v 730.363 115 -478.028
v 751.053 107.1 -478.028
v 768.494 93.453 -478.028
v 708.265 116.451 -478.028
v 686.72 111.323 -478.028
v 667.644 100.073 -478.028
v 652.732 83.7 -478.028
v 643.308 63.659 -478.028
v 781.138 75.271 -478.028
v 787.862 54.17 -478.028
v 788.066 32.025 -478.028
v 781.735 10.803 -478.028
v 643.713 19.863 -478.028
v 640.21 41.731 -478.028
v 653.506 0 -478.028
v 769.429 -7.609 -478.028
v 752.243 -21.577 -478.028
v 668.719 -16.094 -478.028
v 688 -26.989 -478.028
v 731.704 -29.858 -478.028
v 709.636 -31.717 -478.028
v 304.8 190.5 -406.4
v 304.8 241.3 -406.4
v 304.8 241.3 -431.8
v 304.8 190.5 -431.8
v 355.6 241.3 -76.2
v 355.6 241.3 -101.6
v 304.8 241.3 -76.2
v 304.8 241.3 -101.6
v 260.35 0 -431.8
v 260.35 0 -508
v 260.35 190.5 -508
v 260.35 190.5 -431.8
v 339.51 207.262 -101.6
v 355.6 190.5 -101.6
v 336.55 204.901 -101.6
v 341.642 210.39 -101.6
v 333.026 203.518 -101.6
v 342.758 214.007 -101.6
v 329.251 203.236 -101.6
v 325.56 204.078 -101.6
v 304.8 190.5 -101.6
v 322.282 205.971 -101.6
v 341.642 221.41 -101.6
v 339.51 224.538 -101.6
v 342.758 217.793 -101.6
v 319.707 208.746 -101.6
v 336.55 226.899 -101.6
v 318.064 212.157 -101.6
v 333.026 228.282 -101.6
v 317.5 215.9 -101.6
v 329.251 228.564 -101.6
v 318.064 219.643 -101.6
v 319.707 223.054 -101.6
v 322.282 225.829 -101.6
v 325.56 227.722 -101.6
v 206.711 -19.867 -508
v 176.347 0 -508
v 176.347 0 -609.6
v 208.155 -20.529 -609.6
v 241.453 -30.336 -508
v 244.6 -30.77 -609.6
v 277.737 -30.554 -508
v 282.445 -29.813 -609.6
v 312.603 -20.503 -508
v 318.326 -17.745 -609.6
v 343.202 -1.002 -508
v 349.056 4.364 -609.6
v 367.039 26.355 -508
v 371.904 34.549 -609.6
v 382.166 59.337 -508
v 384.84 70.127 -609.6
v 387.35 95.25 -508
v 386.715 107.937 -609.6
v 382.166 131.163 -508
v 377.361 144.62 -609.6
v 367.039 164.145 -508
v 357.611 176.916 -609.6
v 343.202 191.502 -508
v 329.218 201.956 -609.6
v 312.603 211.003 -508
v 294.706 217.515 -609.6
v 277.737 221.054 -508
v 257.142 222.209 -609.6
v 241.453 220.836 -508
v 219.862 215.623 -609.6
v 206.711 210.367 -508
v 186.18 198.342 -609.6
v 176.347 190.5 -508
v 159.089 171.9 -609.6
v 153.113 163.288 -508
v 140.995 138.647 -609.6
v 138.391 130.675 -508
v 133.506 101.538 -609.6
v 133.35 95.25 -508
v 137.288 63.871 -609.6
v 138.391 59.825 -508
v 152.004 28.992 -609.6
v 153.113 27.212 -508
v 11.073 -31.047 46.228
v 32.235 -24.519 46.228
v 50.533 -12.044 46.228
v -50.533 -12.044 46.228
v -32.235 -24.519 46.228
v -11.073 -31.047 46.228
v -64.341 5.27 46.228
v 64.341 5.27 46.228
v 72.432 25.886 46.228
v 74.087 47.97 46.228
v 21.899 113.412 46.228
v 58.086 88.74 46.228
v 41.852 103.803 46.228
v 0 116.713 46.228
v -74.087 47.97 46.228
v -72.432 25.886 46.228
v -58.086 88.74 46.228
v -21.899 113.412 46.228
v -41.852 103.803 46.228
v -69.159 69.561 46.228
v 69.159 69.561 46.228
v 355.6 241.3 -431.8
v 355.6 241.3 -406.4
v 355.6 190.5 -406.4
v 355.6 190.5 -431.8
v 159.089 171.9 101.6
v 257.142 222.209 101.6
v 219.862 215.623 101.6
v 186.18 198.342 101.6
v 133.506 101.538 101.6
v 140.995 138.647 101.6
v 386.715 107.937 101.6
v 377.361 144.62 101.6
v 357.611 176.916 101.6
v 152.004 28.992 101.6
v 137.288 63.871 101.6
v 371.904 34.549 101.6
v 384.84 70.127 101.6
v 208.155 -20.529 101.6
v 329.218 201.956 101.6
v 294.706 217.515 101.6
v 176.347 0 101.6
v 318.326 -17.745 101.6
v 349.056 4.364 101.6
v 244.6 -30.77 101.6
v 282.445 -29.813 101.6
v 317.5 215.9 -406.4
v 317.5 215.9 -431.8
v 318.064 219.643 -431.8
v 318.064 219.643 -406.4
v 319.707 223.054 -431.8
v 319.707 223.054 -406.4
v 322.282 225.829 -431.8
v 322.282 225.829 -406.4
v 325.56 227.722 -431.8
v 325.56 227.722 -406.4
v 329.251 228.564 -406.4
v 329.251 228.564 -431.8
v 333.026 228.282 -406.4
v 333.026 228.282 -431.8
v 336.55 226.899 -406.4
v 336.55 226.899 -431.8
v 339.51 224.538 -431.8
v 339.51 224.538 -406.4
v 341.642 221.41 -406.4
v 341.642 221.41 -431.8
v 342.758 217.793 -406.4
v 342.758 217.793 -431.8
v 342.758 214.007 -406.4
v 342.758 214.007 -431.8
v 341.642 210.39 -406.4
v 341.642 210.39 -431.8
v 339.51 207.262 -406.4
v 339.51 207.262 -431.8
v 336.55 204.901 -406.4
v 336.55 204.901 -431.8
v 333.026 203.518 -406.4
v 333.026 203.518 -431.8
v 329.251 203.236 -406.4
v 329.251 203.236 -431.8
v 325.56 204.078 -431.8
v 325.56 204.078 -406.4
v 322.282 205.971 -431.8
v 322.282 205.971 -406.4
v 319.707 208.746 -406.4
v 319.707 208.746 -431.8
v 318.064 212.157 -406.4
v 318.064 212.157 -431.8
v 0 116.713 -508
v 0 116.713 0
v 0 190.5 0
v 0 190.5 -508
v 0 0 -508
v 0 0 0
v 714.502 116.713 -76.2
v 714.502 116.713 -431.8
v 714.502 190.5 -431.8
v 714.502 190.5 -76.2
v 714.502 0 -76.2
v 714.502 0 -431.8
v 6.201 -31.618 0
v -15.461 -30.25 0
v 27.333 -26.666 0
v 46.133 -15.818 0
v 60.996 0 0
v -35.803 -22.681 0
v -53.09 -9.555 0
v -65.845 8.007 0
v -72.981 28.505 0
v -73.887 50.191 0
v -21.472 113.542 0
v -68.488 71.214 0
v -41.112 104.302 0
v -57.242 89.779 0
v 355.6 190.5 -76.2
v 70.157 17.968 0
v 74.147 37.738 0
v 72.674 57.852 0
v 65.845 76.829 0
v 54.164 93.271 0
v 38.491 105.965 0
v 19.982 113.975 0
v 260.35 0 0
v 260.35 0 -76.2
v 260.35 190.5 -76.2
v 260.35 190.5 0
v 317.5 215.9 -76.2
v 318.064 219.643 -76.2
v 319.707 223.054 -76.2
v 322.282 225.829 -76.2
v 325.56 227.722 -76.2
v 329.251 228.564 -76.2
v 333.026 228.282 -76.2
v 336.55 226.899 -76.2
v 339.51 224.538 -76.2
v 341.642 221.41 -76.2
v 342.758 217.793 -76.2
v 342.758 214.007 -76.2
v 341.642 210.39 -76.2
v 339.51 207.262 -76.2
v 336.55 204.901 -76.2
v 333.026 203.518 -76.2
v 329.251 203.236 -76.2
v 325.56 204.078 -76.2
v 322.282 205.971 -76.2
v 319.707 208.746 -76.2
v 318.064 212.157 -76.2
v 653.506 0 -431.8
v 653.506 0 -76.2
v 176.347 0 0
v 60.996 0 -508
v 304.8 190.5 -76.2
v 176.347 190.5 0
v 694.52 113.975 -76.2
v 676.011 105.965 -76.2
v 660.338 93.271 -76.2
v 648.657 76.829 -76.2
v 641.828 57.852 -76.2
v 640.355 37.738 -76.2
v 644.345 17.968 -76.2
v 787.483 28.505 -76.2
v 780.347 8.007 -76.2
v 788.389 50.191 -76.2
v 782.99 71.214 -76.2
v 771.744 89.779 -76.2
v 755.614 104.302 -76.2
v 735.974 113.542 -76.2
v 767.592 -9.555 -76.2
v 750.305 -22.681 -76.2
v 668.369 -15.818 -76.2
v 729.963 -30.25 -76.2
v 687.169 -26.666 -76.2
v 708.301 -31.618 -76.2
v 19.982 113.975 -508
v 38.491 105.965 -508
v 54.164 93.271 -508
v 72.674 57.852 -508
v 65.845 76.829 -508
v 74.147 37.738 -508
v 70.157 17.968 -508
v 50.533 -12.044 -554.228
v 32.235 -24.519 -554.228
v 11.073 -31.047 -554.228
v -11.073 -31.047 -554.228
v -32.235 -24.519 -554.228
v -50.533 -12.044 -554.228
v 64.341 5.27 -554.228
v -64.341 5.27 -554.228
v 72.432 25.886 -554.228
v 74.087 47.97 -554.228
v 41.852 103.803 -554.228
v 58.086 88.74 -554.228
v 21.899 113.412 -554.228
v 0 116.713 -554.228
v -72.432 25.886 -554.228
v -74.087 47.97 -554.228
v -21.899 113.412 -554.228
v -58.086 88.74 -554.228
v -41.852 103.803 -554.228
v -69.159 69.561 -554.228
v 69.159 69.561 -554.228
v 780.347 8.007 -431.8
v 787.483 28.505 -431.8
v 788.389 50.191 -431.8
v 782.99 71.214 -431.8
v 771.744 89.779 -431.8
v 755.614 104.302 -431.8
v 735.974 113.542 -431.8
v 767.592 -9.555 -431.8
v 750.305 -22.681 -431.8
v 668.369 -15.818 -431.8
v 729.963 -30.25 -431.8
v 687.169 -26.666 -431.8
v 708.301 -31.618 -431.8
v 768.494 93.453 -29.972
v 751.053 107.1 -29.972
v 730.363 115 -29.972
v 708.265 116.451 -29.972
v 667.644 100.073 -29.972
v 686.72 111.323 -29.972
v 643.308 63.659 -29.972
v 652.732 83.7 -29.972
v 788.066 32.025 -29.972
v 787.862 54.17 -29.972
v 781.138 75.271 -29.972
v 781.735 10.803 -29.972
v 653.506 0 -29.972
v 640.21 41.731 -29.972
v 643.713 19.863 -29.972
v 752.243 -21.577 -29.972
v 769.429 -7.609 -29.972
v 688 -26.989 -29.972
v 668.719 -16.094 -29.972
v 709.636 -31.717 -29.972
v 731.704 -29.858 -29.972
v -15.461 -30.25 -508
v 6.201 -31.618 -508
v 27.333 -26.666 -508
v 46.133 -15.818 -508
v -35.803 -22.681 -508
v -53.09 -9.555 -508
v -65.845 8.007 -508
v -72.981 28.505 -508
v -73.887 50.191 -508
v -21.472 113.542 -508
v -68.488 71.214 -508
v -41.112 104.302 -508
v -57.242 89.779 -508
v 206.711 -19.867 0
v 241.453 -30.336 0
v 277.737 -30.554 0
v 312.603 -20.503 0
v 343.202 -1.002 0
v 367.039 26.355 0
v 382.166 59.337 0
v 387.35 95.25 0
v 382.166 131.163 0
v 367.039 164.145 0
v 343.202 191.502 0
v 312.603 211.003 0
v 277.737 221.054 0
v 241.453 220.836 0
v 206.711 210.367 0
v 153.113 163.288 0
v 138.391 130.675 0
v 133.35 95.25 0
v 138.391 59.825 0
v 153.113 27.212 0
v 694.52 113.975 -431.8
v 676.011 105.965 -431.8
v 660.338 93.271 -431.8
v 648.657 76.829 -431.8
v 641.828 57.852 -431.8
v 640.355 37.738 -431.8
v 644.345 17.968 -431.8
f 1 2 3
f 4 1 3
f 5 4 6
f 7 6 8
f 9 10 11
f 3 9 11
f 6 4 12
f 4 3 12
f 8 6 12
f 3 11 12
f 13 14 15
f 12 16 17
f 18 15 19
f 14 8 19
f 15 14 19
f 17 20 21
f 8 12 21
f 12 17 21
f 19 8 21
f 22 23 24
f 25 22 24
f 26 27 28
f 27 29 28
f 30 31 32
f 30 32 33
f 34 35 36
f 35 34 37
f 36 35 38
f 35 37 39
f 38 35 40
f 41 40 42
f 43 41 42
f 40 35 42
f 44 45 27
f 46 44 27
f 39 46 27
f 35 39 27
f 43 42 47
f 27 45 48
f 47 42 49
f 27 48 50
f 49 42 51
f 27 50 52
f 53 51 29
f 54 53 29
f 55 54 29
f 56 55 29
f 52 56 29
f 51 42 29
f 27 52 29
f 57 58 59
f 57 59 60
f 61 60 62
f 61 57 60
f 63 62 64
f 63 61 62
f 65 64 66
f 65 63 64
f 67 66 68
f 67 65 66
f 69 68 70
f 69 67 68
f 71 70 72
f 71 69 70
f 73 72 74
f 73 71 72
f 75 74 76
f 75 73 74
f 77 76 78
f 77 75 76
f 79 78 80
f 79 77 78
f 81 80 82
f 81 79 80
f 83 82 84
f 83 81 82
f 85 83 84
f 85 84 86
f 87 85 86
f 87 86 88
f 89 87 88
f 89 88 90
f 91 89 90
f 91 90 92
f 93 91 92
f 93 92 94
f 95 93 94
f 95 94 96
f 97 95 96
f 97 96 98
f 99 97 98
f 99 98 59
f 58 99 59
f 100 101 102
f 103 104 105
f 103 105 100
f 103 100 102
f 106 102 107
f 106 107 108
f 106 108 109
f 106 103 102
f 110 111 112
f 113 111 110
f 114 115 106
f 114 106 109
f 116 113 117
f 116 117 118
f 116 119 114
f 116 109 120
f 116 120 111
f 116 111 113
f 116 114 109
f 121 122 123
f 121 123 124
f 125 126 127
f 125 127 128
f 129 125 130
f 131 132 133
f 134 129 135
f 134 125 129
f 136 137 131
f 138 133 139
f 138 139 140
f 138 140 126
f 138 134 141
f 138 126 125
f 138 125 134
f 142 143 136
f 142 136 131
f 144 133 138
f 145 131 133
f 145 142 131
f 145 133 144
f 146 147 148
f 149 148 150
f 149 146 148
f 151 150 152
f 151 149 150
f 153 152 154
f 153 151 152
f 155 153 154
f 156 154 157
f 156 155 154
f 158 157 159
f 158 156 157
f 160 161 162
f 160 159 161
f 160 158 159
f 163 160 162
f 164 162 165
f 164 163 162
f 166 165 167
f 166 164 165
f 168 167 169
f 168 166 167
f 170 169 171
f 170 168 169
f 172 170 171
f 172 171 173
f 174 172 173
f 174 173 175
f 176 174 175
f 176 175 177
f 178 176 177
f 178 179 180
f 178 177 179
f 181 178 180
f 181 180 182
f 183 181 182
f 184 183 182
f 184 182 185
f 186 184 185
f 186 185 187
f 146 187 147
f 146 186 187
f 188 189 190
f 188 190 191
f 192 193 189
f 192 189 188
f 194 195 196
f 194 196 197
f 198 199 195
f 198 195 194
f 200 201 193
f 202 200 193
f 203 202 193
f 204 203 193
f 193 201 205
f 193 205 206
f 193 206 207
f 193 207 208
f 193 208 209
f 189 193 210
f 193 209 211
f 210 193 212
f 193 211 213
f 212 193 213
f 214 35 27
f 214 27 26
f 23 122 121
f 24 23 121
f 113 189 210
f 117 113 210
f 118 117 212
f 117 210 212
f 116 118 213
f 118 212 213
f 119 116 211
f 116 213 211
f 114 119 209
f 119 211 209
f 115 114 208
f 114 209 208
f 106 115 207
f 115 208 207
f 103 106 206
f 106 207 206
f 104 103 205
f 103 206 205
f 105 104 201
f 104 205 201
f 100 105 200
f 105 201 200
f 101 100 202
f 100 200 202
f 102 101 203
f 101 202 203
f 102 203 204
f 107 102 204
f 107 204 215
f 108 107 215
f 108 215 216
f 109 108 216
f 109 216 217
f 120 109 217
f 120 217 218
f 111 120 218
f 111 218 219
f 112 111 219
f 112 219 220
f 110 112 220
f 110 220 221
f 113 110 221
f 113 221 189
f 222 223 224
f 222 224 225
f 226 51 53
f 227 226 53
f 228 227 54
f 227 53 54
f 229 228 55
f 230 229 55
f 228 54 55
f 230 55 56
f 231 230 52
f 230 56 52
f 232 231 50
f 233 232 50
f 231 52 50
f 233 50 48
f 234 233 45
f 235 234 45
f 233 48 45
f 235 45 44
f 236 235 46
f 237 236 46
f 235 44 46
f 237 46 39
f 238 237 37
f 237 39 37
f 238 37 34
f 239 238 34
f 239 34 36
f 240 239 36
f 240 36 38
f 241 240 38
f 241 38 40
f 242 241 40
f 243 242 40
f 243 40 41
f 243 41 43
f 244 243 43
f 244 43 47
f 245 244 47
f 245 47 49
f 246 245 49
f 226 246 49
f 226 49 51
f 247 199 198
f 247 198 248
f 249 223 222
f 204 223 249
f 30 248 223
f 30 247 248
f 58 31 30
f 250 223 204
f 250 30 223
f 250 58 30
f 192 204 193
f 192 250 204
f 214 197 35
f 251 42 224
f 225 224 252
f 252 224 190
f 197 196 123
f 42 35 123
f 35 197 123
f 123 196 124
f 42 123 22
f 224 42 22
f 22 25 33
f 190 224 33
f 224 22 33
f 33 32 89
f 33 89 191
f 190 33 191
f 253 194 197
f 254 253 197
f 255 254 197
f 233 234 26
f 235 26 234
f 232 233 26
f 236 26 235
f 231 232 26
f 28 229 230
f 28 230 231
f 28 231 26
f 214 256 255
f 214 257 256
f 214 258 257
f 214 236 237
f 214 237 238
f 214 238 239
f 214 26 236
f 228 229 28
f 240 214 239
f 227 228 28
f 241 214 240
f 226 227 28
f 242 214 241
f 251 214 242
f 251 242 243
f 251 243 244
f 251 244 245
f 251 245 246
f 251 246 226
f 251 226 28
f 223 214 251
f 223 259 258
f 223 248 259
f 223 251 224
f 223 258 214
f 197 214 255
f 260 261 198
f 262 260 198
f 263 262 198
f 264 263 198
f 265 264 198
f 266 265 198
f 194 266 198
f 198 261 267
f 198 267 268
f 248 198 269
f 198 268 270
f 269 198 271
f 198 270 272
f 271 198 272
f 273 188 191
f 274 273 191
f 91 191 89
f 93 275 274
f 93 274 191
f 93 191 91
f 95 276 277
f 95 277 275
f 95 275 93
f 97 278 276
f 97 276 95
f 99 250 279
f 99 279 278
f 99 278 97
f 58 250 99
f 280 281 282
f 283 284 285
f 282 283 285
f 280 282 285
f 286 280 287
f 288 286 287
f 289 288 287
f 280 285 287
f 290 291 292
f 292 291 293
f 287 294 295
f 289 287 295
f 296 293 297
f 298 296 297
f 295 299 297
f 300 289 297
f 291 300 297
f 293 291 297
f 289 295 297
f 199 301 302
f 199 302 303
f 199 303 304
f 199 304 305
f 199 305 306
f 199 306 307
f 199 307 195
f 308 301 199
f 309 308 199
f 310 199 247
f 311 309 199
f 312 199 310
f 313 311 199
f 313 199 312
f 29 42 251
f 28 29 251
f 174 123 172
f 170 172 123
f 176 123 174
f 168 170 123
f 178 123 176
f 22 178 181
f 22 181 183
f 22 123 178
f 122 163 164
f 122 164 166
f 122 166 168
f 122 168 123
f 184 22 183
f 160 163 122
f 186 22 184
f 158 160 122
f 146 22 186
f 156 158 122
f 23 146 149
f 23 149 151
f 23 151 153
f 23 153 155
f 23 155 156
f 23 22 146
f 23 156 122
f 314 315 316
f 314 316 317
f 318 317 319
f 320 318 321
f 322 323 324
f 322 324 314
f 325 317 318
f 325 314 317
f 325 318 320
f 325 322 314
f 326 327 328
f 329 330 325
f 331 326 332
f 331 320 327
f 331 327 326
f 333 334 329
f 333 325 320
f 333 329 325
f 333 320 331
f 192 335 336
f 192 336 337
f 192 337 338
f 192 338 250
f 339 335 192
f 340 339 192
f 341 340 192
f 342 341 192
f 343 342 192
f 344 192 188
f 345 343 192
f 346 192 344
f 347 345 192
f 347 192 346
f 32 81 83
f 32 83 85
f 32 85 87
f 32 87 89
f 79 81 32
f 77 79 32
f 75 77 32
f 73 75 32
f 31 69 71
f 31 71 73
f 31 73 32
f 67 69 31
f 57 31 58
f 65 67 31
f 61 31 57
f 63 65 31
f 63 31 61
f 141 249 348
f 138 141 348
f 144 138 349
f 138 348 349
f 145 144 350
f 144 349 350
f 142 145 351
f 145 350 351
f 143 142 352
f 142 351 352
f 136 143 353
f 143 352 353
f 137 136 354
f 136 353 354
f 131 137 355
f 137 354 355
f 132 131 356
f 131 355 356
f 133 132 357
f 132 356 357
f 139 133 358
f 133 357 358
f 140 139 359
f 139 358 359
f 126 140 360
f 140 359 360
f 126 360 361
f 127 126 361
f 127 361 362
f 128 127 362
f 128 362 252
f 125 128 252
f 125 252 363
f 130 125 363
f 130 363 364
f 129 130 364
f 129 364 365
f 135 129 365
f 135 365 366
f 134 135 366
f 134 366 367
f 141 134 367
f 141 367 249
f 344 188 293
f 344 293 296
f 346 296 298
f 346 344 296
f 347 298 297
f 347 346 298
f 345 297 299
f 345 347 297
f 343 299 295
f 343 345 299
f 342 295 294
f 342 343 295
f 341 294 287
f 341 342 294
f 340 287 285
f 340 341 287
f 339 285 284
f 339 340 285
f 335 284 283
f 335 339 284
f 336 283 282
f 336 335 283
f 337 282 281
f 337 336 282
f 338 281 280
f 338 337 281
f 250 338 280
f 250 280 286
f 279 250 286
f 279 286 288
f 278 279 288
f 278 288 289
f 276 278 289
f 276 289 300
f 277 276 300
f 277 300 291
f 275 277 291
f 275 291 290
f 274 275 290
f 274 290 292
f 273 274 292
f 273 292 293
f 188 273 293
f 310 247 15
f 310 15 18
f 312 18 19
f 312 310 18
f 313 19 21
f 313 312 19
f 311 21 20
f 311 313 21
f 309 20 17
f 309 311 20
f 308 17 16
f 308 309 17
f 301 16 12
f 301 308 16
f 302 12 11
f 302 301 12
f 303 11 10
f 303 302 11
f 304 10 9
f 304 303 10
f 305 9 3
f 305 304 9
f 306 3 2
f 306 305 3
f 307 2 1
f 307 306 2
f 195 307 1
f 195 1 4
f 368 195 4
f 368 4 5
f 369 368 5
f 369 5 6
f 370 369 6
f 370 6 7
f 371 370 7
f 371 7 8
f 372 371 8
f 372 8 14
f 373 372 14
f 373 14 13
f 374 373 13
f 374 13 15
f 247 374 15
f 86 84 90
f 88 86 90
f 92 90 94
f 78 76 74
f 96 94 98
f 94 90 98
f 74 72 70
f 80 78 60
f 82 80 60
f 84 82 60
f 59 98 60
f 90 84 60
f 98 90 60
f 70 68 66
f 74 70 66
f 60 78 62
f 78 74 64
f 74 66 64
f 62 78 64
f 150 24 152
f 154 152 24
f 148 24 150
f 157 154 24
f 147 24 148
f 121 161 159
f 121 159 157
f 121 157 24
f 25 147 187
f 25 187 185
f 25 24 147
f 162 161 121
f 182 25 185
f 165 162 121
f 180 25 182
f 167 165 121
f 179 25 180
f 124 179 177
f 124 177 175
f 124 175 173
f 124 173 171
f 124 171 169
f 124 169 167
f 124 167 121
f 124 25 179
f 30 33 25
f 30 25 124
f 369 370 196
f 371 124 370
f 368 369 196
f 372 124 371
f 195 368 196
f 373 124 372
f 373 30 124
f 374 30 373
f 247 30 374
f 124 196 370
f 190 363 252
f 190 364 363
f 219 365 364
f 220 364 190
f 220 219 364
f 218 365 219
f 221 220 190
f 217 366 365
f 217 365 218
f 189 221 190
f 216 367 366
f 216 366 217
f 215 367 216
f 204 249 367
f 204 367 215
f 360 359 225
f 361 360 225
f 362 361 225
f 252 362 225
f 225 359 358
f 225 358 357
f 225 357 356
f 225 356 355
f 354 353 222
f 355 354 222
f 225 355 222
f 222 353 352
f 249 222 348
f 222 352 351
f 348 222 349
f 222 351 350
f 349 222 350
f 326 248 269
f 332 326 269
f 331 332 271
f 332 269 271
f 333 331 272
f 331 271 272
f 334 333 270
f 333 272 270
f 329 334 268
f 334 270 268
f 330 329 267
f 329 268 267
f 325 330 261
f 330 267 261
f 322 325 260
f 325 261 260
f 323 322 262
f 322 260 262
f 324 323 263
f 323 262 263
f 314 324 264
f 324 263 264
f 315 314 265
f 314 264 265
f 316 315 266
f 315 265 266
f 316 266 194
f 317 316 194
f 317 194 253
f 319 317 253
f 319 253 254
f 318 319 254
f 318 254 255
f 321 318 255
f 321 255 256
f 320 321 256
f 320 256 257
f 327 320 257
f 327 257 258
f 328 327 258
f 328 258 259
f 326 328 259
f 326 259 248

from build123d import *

# Parameters (mm, degrees)
BOSS_EXTRUDE1_DEPTH = 190.5
SKETCH2_R           = 127
BOSS_EXTRUDE2_DEPTH = 101.6
SKETCH3_R           = 74.295
BOSS_EXTRUDE3_DEPTH = 46.228
SKETCH4_R           = 74.295
BOSS_EXTRUDE4_DEPTH = 46.228
SKETCH6_W           = 25.4
SKETCH6_H           = 50.8
BOSS_EXTRUDE5_DEPTH = 25.4
SKETCH7_R           = 12.7
CUT_EXTRUDE1_DEPTH  = 73.152


with BuildPart() as part:
    # Sketch1 → Boss-Extrude1 (new body)
    with BuildSketch(Plane(origin=(0, 0, 0), x_dir=(1, 0, 0), z_dir=(0, 1, 0))):
        Polygon((260.35, 508), (260.35, 431.8), (714.502, 431.8), (714.502, 76.2), (260.35, 76.2), (260.35, 0), (0, 0), (0, 508), align=None)
    extrude(amount=BOSS_EXTRUDE1_DEPTH)

    # Sketch2 → Boss-Extrude2 (add)
    with BuildSketch(Plane.XY):
        with Locations(Location((260.35, 95.25, 0), (0, 0, 228.590377891))):
            Circle(SKETCH2_R)
    boss_extrude2 = extrude(amount=BOSS_EXTRUDE2_DEPTH)

    # Sketch3 → Boss-Extrude3 (add)
    with BuildSketch(Plane.XY):
        with Locations(Location((0, 42.418, 0), (0, 0, 90))):
            Circle(SKETCH3_R)
    boss_extrude3 = extrude(amount=BOSS_EXTRUDE3_DEPTH)

    # Sketch4 → Boss-Extrude4 (add)
    with BuildSketch(Plane.XY.offset(-76.2)):
        with Locations(Location((714.502, 42.418, 0), (0, 0, 214.815812785))):
            Circle(SKETCH4_R)
    boss_extrude4 = extrude(amount=BOSS_EXTRUDE4_DEPTH)

    # Mirror1: Boss-Extrude2, Boss-Extrude3, Boss-Extrude4 across plane
    add(boss_extrude2.mirror(Plane.XY.offset(-254)))
    add(boss_extrude3.mirror(Plane.XY.offset(-254)))
    add(boss_extrude4.mirror(Plane.XY.offset(-254)))

    # Sketch6 → Boss-Extrude5 (add, symmetric)
    with BuildSketch(Plane.ZY.offset(-330.2)):
        with Locations((-88.9, 215.9)):
            Rectangle(SKETCH6_W, SKETCH6_H)
    boss_extrude5 = extrude(amount=BOSS_EXTRUDE5_DEPTH, both=True)

    # Sketch7 → Cut-Extrude1 (cut)
    with BuildSketch(Plane(origin=(0, 0, -101.6), x_dir=(-1, 0, 0), z_dir=(0, 0, -1))):
        with Locations((-330.2, 215.9)):
            Circle(SKETCH7_R)
    cut_extrude1 = extrude(amount=-CUT_EXTRUDE1_DEPTH, mode=Mode.SUBTRACT)

    # Mirror2: Boss-Extrude5, Cut-Extrude1 across plane
    add(boss_extrude5.mirror(Plane.XY.offset(-254)))
    add(cut_extrude1.mirror(Plane.XY.offset(-254)), mode=Mode.SUBTRACT)


solid = part.part
